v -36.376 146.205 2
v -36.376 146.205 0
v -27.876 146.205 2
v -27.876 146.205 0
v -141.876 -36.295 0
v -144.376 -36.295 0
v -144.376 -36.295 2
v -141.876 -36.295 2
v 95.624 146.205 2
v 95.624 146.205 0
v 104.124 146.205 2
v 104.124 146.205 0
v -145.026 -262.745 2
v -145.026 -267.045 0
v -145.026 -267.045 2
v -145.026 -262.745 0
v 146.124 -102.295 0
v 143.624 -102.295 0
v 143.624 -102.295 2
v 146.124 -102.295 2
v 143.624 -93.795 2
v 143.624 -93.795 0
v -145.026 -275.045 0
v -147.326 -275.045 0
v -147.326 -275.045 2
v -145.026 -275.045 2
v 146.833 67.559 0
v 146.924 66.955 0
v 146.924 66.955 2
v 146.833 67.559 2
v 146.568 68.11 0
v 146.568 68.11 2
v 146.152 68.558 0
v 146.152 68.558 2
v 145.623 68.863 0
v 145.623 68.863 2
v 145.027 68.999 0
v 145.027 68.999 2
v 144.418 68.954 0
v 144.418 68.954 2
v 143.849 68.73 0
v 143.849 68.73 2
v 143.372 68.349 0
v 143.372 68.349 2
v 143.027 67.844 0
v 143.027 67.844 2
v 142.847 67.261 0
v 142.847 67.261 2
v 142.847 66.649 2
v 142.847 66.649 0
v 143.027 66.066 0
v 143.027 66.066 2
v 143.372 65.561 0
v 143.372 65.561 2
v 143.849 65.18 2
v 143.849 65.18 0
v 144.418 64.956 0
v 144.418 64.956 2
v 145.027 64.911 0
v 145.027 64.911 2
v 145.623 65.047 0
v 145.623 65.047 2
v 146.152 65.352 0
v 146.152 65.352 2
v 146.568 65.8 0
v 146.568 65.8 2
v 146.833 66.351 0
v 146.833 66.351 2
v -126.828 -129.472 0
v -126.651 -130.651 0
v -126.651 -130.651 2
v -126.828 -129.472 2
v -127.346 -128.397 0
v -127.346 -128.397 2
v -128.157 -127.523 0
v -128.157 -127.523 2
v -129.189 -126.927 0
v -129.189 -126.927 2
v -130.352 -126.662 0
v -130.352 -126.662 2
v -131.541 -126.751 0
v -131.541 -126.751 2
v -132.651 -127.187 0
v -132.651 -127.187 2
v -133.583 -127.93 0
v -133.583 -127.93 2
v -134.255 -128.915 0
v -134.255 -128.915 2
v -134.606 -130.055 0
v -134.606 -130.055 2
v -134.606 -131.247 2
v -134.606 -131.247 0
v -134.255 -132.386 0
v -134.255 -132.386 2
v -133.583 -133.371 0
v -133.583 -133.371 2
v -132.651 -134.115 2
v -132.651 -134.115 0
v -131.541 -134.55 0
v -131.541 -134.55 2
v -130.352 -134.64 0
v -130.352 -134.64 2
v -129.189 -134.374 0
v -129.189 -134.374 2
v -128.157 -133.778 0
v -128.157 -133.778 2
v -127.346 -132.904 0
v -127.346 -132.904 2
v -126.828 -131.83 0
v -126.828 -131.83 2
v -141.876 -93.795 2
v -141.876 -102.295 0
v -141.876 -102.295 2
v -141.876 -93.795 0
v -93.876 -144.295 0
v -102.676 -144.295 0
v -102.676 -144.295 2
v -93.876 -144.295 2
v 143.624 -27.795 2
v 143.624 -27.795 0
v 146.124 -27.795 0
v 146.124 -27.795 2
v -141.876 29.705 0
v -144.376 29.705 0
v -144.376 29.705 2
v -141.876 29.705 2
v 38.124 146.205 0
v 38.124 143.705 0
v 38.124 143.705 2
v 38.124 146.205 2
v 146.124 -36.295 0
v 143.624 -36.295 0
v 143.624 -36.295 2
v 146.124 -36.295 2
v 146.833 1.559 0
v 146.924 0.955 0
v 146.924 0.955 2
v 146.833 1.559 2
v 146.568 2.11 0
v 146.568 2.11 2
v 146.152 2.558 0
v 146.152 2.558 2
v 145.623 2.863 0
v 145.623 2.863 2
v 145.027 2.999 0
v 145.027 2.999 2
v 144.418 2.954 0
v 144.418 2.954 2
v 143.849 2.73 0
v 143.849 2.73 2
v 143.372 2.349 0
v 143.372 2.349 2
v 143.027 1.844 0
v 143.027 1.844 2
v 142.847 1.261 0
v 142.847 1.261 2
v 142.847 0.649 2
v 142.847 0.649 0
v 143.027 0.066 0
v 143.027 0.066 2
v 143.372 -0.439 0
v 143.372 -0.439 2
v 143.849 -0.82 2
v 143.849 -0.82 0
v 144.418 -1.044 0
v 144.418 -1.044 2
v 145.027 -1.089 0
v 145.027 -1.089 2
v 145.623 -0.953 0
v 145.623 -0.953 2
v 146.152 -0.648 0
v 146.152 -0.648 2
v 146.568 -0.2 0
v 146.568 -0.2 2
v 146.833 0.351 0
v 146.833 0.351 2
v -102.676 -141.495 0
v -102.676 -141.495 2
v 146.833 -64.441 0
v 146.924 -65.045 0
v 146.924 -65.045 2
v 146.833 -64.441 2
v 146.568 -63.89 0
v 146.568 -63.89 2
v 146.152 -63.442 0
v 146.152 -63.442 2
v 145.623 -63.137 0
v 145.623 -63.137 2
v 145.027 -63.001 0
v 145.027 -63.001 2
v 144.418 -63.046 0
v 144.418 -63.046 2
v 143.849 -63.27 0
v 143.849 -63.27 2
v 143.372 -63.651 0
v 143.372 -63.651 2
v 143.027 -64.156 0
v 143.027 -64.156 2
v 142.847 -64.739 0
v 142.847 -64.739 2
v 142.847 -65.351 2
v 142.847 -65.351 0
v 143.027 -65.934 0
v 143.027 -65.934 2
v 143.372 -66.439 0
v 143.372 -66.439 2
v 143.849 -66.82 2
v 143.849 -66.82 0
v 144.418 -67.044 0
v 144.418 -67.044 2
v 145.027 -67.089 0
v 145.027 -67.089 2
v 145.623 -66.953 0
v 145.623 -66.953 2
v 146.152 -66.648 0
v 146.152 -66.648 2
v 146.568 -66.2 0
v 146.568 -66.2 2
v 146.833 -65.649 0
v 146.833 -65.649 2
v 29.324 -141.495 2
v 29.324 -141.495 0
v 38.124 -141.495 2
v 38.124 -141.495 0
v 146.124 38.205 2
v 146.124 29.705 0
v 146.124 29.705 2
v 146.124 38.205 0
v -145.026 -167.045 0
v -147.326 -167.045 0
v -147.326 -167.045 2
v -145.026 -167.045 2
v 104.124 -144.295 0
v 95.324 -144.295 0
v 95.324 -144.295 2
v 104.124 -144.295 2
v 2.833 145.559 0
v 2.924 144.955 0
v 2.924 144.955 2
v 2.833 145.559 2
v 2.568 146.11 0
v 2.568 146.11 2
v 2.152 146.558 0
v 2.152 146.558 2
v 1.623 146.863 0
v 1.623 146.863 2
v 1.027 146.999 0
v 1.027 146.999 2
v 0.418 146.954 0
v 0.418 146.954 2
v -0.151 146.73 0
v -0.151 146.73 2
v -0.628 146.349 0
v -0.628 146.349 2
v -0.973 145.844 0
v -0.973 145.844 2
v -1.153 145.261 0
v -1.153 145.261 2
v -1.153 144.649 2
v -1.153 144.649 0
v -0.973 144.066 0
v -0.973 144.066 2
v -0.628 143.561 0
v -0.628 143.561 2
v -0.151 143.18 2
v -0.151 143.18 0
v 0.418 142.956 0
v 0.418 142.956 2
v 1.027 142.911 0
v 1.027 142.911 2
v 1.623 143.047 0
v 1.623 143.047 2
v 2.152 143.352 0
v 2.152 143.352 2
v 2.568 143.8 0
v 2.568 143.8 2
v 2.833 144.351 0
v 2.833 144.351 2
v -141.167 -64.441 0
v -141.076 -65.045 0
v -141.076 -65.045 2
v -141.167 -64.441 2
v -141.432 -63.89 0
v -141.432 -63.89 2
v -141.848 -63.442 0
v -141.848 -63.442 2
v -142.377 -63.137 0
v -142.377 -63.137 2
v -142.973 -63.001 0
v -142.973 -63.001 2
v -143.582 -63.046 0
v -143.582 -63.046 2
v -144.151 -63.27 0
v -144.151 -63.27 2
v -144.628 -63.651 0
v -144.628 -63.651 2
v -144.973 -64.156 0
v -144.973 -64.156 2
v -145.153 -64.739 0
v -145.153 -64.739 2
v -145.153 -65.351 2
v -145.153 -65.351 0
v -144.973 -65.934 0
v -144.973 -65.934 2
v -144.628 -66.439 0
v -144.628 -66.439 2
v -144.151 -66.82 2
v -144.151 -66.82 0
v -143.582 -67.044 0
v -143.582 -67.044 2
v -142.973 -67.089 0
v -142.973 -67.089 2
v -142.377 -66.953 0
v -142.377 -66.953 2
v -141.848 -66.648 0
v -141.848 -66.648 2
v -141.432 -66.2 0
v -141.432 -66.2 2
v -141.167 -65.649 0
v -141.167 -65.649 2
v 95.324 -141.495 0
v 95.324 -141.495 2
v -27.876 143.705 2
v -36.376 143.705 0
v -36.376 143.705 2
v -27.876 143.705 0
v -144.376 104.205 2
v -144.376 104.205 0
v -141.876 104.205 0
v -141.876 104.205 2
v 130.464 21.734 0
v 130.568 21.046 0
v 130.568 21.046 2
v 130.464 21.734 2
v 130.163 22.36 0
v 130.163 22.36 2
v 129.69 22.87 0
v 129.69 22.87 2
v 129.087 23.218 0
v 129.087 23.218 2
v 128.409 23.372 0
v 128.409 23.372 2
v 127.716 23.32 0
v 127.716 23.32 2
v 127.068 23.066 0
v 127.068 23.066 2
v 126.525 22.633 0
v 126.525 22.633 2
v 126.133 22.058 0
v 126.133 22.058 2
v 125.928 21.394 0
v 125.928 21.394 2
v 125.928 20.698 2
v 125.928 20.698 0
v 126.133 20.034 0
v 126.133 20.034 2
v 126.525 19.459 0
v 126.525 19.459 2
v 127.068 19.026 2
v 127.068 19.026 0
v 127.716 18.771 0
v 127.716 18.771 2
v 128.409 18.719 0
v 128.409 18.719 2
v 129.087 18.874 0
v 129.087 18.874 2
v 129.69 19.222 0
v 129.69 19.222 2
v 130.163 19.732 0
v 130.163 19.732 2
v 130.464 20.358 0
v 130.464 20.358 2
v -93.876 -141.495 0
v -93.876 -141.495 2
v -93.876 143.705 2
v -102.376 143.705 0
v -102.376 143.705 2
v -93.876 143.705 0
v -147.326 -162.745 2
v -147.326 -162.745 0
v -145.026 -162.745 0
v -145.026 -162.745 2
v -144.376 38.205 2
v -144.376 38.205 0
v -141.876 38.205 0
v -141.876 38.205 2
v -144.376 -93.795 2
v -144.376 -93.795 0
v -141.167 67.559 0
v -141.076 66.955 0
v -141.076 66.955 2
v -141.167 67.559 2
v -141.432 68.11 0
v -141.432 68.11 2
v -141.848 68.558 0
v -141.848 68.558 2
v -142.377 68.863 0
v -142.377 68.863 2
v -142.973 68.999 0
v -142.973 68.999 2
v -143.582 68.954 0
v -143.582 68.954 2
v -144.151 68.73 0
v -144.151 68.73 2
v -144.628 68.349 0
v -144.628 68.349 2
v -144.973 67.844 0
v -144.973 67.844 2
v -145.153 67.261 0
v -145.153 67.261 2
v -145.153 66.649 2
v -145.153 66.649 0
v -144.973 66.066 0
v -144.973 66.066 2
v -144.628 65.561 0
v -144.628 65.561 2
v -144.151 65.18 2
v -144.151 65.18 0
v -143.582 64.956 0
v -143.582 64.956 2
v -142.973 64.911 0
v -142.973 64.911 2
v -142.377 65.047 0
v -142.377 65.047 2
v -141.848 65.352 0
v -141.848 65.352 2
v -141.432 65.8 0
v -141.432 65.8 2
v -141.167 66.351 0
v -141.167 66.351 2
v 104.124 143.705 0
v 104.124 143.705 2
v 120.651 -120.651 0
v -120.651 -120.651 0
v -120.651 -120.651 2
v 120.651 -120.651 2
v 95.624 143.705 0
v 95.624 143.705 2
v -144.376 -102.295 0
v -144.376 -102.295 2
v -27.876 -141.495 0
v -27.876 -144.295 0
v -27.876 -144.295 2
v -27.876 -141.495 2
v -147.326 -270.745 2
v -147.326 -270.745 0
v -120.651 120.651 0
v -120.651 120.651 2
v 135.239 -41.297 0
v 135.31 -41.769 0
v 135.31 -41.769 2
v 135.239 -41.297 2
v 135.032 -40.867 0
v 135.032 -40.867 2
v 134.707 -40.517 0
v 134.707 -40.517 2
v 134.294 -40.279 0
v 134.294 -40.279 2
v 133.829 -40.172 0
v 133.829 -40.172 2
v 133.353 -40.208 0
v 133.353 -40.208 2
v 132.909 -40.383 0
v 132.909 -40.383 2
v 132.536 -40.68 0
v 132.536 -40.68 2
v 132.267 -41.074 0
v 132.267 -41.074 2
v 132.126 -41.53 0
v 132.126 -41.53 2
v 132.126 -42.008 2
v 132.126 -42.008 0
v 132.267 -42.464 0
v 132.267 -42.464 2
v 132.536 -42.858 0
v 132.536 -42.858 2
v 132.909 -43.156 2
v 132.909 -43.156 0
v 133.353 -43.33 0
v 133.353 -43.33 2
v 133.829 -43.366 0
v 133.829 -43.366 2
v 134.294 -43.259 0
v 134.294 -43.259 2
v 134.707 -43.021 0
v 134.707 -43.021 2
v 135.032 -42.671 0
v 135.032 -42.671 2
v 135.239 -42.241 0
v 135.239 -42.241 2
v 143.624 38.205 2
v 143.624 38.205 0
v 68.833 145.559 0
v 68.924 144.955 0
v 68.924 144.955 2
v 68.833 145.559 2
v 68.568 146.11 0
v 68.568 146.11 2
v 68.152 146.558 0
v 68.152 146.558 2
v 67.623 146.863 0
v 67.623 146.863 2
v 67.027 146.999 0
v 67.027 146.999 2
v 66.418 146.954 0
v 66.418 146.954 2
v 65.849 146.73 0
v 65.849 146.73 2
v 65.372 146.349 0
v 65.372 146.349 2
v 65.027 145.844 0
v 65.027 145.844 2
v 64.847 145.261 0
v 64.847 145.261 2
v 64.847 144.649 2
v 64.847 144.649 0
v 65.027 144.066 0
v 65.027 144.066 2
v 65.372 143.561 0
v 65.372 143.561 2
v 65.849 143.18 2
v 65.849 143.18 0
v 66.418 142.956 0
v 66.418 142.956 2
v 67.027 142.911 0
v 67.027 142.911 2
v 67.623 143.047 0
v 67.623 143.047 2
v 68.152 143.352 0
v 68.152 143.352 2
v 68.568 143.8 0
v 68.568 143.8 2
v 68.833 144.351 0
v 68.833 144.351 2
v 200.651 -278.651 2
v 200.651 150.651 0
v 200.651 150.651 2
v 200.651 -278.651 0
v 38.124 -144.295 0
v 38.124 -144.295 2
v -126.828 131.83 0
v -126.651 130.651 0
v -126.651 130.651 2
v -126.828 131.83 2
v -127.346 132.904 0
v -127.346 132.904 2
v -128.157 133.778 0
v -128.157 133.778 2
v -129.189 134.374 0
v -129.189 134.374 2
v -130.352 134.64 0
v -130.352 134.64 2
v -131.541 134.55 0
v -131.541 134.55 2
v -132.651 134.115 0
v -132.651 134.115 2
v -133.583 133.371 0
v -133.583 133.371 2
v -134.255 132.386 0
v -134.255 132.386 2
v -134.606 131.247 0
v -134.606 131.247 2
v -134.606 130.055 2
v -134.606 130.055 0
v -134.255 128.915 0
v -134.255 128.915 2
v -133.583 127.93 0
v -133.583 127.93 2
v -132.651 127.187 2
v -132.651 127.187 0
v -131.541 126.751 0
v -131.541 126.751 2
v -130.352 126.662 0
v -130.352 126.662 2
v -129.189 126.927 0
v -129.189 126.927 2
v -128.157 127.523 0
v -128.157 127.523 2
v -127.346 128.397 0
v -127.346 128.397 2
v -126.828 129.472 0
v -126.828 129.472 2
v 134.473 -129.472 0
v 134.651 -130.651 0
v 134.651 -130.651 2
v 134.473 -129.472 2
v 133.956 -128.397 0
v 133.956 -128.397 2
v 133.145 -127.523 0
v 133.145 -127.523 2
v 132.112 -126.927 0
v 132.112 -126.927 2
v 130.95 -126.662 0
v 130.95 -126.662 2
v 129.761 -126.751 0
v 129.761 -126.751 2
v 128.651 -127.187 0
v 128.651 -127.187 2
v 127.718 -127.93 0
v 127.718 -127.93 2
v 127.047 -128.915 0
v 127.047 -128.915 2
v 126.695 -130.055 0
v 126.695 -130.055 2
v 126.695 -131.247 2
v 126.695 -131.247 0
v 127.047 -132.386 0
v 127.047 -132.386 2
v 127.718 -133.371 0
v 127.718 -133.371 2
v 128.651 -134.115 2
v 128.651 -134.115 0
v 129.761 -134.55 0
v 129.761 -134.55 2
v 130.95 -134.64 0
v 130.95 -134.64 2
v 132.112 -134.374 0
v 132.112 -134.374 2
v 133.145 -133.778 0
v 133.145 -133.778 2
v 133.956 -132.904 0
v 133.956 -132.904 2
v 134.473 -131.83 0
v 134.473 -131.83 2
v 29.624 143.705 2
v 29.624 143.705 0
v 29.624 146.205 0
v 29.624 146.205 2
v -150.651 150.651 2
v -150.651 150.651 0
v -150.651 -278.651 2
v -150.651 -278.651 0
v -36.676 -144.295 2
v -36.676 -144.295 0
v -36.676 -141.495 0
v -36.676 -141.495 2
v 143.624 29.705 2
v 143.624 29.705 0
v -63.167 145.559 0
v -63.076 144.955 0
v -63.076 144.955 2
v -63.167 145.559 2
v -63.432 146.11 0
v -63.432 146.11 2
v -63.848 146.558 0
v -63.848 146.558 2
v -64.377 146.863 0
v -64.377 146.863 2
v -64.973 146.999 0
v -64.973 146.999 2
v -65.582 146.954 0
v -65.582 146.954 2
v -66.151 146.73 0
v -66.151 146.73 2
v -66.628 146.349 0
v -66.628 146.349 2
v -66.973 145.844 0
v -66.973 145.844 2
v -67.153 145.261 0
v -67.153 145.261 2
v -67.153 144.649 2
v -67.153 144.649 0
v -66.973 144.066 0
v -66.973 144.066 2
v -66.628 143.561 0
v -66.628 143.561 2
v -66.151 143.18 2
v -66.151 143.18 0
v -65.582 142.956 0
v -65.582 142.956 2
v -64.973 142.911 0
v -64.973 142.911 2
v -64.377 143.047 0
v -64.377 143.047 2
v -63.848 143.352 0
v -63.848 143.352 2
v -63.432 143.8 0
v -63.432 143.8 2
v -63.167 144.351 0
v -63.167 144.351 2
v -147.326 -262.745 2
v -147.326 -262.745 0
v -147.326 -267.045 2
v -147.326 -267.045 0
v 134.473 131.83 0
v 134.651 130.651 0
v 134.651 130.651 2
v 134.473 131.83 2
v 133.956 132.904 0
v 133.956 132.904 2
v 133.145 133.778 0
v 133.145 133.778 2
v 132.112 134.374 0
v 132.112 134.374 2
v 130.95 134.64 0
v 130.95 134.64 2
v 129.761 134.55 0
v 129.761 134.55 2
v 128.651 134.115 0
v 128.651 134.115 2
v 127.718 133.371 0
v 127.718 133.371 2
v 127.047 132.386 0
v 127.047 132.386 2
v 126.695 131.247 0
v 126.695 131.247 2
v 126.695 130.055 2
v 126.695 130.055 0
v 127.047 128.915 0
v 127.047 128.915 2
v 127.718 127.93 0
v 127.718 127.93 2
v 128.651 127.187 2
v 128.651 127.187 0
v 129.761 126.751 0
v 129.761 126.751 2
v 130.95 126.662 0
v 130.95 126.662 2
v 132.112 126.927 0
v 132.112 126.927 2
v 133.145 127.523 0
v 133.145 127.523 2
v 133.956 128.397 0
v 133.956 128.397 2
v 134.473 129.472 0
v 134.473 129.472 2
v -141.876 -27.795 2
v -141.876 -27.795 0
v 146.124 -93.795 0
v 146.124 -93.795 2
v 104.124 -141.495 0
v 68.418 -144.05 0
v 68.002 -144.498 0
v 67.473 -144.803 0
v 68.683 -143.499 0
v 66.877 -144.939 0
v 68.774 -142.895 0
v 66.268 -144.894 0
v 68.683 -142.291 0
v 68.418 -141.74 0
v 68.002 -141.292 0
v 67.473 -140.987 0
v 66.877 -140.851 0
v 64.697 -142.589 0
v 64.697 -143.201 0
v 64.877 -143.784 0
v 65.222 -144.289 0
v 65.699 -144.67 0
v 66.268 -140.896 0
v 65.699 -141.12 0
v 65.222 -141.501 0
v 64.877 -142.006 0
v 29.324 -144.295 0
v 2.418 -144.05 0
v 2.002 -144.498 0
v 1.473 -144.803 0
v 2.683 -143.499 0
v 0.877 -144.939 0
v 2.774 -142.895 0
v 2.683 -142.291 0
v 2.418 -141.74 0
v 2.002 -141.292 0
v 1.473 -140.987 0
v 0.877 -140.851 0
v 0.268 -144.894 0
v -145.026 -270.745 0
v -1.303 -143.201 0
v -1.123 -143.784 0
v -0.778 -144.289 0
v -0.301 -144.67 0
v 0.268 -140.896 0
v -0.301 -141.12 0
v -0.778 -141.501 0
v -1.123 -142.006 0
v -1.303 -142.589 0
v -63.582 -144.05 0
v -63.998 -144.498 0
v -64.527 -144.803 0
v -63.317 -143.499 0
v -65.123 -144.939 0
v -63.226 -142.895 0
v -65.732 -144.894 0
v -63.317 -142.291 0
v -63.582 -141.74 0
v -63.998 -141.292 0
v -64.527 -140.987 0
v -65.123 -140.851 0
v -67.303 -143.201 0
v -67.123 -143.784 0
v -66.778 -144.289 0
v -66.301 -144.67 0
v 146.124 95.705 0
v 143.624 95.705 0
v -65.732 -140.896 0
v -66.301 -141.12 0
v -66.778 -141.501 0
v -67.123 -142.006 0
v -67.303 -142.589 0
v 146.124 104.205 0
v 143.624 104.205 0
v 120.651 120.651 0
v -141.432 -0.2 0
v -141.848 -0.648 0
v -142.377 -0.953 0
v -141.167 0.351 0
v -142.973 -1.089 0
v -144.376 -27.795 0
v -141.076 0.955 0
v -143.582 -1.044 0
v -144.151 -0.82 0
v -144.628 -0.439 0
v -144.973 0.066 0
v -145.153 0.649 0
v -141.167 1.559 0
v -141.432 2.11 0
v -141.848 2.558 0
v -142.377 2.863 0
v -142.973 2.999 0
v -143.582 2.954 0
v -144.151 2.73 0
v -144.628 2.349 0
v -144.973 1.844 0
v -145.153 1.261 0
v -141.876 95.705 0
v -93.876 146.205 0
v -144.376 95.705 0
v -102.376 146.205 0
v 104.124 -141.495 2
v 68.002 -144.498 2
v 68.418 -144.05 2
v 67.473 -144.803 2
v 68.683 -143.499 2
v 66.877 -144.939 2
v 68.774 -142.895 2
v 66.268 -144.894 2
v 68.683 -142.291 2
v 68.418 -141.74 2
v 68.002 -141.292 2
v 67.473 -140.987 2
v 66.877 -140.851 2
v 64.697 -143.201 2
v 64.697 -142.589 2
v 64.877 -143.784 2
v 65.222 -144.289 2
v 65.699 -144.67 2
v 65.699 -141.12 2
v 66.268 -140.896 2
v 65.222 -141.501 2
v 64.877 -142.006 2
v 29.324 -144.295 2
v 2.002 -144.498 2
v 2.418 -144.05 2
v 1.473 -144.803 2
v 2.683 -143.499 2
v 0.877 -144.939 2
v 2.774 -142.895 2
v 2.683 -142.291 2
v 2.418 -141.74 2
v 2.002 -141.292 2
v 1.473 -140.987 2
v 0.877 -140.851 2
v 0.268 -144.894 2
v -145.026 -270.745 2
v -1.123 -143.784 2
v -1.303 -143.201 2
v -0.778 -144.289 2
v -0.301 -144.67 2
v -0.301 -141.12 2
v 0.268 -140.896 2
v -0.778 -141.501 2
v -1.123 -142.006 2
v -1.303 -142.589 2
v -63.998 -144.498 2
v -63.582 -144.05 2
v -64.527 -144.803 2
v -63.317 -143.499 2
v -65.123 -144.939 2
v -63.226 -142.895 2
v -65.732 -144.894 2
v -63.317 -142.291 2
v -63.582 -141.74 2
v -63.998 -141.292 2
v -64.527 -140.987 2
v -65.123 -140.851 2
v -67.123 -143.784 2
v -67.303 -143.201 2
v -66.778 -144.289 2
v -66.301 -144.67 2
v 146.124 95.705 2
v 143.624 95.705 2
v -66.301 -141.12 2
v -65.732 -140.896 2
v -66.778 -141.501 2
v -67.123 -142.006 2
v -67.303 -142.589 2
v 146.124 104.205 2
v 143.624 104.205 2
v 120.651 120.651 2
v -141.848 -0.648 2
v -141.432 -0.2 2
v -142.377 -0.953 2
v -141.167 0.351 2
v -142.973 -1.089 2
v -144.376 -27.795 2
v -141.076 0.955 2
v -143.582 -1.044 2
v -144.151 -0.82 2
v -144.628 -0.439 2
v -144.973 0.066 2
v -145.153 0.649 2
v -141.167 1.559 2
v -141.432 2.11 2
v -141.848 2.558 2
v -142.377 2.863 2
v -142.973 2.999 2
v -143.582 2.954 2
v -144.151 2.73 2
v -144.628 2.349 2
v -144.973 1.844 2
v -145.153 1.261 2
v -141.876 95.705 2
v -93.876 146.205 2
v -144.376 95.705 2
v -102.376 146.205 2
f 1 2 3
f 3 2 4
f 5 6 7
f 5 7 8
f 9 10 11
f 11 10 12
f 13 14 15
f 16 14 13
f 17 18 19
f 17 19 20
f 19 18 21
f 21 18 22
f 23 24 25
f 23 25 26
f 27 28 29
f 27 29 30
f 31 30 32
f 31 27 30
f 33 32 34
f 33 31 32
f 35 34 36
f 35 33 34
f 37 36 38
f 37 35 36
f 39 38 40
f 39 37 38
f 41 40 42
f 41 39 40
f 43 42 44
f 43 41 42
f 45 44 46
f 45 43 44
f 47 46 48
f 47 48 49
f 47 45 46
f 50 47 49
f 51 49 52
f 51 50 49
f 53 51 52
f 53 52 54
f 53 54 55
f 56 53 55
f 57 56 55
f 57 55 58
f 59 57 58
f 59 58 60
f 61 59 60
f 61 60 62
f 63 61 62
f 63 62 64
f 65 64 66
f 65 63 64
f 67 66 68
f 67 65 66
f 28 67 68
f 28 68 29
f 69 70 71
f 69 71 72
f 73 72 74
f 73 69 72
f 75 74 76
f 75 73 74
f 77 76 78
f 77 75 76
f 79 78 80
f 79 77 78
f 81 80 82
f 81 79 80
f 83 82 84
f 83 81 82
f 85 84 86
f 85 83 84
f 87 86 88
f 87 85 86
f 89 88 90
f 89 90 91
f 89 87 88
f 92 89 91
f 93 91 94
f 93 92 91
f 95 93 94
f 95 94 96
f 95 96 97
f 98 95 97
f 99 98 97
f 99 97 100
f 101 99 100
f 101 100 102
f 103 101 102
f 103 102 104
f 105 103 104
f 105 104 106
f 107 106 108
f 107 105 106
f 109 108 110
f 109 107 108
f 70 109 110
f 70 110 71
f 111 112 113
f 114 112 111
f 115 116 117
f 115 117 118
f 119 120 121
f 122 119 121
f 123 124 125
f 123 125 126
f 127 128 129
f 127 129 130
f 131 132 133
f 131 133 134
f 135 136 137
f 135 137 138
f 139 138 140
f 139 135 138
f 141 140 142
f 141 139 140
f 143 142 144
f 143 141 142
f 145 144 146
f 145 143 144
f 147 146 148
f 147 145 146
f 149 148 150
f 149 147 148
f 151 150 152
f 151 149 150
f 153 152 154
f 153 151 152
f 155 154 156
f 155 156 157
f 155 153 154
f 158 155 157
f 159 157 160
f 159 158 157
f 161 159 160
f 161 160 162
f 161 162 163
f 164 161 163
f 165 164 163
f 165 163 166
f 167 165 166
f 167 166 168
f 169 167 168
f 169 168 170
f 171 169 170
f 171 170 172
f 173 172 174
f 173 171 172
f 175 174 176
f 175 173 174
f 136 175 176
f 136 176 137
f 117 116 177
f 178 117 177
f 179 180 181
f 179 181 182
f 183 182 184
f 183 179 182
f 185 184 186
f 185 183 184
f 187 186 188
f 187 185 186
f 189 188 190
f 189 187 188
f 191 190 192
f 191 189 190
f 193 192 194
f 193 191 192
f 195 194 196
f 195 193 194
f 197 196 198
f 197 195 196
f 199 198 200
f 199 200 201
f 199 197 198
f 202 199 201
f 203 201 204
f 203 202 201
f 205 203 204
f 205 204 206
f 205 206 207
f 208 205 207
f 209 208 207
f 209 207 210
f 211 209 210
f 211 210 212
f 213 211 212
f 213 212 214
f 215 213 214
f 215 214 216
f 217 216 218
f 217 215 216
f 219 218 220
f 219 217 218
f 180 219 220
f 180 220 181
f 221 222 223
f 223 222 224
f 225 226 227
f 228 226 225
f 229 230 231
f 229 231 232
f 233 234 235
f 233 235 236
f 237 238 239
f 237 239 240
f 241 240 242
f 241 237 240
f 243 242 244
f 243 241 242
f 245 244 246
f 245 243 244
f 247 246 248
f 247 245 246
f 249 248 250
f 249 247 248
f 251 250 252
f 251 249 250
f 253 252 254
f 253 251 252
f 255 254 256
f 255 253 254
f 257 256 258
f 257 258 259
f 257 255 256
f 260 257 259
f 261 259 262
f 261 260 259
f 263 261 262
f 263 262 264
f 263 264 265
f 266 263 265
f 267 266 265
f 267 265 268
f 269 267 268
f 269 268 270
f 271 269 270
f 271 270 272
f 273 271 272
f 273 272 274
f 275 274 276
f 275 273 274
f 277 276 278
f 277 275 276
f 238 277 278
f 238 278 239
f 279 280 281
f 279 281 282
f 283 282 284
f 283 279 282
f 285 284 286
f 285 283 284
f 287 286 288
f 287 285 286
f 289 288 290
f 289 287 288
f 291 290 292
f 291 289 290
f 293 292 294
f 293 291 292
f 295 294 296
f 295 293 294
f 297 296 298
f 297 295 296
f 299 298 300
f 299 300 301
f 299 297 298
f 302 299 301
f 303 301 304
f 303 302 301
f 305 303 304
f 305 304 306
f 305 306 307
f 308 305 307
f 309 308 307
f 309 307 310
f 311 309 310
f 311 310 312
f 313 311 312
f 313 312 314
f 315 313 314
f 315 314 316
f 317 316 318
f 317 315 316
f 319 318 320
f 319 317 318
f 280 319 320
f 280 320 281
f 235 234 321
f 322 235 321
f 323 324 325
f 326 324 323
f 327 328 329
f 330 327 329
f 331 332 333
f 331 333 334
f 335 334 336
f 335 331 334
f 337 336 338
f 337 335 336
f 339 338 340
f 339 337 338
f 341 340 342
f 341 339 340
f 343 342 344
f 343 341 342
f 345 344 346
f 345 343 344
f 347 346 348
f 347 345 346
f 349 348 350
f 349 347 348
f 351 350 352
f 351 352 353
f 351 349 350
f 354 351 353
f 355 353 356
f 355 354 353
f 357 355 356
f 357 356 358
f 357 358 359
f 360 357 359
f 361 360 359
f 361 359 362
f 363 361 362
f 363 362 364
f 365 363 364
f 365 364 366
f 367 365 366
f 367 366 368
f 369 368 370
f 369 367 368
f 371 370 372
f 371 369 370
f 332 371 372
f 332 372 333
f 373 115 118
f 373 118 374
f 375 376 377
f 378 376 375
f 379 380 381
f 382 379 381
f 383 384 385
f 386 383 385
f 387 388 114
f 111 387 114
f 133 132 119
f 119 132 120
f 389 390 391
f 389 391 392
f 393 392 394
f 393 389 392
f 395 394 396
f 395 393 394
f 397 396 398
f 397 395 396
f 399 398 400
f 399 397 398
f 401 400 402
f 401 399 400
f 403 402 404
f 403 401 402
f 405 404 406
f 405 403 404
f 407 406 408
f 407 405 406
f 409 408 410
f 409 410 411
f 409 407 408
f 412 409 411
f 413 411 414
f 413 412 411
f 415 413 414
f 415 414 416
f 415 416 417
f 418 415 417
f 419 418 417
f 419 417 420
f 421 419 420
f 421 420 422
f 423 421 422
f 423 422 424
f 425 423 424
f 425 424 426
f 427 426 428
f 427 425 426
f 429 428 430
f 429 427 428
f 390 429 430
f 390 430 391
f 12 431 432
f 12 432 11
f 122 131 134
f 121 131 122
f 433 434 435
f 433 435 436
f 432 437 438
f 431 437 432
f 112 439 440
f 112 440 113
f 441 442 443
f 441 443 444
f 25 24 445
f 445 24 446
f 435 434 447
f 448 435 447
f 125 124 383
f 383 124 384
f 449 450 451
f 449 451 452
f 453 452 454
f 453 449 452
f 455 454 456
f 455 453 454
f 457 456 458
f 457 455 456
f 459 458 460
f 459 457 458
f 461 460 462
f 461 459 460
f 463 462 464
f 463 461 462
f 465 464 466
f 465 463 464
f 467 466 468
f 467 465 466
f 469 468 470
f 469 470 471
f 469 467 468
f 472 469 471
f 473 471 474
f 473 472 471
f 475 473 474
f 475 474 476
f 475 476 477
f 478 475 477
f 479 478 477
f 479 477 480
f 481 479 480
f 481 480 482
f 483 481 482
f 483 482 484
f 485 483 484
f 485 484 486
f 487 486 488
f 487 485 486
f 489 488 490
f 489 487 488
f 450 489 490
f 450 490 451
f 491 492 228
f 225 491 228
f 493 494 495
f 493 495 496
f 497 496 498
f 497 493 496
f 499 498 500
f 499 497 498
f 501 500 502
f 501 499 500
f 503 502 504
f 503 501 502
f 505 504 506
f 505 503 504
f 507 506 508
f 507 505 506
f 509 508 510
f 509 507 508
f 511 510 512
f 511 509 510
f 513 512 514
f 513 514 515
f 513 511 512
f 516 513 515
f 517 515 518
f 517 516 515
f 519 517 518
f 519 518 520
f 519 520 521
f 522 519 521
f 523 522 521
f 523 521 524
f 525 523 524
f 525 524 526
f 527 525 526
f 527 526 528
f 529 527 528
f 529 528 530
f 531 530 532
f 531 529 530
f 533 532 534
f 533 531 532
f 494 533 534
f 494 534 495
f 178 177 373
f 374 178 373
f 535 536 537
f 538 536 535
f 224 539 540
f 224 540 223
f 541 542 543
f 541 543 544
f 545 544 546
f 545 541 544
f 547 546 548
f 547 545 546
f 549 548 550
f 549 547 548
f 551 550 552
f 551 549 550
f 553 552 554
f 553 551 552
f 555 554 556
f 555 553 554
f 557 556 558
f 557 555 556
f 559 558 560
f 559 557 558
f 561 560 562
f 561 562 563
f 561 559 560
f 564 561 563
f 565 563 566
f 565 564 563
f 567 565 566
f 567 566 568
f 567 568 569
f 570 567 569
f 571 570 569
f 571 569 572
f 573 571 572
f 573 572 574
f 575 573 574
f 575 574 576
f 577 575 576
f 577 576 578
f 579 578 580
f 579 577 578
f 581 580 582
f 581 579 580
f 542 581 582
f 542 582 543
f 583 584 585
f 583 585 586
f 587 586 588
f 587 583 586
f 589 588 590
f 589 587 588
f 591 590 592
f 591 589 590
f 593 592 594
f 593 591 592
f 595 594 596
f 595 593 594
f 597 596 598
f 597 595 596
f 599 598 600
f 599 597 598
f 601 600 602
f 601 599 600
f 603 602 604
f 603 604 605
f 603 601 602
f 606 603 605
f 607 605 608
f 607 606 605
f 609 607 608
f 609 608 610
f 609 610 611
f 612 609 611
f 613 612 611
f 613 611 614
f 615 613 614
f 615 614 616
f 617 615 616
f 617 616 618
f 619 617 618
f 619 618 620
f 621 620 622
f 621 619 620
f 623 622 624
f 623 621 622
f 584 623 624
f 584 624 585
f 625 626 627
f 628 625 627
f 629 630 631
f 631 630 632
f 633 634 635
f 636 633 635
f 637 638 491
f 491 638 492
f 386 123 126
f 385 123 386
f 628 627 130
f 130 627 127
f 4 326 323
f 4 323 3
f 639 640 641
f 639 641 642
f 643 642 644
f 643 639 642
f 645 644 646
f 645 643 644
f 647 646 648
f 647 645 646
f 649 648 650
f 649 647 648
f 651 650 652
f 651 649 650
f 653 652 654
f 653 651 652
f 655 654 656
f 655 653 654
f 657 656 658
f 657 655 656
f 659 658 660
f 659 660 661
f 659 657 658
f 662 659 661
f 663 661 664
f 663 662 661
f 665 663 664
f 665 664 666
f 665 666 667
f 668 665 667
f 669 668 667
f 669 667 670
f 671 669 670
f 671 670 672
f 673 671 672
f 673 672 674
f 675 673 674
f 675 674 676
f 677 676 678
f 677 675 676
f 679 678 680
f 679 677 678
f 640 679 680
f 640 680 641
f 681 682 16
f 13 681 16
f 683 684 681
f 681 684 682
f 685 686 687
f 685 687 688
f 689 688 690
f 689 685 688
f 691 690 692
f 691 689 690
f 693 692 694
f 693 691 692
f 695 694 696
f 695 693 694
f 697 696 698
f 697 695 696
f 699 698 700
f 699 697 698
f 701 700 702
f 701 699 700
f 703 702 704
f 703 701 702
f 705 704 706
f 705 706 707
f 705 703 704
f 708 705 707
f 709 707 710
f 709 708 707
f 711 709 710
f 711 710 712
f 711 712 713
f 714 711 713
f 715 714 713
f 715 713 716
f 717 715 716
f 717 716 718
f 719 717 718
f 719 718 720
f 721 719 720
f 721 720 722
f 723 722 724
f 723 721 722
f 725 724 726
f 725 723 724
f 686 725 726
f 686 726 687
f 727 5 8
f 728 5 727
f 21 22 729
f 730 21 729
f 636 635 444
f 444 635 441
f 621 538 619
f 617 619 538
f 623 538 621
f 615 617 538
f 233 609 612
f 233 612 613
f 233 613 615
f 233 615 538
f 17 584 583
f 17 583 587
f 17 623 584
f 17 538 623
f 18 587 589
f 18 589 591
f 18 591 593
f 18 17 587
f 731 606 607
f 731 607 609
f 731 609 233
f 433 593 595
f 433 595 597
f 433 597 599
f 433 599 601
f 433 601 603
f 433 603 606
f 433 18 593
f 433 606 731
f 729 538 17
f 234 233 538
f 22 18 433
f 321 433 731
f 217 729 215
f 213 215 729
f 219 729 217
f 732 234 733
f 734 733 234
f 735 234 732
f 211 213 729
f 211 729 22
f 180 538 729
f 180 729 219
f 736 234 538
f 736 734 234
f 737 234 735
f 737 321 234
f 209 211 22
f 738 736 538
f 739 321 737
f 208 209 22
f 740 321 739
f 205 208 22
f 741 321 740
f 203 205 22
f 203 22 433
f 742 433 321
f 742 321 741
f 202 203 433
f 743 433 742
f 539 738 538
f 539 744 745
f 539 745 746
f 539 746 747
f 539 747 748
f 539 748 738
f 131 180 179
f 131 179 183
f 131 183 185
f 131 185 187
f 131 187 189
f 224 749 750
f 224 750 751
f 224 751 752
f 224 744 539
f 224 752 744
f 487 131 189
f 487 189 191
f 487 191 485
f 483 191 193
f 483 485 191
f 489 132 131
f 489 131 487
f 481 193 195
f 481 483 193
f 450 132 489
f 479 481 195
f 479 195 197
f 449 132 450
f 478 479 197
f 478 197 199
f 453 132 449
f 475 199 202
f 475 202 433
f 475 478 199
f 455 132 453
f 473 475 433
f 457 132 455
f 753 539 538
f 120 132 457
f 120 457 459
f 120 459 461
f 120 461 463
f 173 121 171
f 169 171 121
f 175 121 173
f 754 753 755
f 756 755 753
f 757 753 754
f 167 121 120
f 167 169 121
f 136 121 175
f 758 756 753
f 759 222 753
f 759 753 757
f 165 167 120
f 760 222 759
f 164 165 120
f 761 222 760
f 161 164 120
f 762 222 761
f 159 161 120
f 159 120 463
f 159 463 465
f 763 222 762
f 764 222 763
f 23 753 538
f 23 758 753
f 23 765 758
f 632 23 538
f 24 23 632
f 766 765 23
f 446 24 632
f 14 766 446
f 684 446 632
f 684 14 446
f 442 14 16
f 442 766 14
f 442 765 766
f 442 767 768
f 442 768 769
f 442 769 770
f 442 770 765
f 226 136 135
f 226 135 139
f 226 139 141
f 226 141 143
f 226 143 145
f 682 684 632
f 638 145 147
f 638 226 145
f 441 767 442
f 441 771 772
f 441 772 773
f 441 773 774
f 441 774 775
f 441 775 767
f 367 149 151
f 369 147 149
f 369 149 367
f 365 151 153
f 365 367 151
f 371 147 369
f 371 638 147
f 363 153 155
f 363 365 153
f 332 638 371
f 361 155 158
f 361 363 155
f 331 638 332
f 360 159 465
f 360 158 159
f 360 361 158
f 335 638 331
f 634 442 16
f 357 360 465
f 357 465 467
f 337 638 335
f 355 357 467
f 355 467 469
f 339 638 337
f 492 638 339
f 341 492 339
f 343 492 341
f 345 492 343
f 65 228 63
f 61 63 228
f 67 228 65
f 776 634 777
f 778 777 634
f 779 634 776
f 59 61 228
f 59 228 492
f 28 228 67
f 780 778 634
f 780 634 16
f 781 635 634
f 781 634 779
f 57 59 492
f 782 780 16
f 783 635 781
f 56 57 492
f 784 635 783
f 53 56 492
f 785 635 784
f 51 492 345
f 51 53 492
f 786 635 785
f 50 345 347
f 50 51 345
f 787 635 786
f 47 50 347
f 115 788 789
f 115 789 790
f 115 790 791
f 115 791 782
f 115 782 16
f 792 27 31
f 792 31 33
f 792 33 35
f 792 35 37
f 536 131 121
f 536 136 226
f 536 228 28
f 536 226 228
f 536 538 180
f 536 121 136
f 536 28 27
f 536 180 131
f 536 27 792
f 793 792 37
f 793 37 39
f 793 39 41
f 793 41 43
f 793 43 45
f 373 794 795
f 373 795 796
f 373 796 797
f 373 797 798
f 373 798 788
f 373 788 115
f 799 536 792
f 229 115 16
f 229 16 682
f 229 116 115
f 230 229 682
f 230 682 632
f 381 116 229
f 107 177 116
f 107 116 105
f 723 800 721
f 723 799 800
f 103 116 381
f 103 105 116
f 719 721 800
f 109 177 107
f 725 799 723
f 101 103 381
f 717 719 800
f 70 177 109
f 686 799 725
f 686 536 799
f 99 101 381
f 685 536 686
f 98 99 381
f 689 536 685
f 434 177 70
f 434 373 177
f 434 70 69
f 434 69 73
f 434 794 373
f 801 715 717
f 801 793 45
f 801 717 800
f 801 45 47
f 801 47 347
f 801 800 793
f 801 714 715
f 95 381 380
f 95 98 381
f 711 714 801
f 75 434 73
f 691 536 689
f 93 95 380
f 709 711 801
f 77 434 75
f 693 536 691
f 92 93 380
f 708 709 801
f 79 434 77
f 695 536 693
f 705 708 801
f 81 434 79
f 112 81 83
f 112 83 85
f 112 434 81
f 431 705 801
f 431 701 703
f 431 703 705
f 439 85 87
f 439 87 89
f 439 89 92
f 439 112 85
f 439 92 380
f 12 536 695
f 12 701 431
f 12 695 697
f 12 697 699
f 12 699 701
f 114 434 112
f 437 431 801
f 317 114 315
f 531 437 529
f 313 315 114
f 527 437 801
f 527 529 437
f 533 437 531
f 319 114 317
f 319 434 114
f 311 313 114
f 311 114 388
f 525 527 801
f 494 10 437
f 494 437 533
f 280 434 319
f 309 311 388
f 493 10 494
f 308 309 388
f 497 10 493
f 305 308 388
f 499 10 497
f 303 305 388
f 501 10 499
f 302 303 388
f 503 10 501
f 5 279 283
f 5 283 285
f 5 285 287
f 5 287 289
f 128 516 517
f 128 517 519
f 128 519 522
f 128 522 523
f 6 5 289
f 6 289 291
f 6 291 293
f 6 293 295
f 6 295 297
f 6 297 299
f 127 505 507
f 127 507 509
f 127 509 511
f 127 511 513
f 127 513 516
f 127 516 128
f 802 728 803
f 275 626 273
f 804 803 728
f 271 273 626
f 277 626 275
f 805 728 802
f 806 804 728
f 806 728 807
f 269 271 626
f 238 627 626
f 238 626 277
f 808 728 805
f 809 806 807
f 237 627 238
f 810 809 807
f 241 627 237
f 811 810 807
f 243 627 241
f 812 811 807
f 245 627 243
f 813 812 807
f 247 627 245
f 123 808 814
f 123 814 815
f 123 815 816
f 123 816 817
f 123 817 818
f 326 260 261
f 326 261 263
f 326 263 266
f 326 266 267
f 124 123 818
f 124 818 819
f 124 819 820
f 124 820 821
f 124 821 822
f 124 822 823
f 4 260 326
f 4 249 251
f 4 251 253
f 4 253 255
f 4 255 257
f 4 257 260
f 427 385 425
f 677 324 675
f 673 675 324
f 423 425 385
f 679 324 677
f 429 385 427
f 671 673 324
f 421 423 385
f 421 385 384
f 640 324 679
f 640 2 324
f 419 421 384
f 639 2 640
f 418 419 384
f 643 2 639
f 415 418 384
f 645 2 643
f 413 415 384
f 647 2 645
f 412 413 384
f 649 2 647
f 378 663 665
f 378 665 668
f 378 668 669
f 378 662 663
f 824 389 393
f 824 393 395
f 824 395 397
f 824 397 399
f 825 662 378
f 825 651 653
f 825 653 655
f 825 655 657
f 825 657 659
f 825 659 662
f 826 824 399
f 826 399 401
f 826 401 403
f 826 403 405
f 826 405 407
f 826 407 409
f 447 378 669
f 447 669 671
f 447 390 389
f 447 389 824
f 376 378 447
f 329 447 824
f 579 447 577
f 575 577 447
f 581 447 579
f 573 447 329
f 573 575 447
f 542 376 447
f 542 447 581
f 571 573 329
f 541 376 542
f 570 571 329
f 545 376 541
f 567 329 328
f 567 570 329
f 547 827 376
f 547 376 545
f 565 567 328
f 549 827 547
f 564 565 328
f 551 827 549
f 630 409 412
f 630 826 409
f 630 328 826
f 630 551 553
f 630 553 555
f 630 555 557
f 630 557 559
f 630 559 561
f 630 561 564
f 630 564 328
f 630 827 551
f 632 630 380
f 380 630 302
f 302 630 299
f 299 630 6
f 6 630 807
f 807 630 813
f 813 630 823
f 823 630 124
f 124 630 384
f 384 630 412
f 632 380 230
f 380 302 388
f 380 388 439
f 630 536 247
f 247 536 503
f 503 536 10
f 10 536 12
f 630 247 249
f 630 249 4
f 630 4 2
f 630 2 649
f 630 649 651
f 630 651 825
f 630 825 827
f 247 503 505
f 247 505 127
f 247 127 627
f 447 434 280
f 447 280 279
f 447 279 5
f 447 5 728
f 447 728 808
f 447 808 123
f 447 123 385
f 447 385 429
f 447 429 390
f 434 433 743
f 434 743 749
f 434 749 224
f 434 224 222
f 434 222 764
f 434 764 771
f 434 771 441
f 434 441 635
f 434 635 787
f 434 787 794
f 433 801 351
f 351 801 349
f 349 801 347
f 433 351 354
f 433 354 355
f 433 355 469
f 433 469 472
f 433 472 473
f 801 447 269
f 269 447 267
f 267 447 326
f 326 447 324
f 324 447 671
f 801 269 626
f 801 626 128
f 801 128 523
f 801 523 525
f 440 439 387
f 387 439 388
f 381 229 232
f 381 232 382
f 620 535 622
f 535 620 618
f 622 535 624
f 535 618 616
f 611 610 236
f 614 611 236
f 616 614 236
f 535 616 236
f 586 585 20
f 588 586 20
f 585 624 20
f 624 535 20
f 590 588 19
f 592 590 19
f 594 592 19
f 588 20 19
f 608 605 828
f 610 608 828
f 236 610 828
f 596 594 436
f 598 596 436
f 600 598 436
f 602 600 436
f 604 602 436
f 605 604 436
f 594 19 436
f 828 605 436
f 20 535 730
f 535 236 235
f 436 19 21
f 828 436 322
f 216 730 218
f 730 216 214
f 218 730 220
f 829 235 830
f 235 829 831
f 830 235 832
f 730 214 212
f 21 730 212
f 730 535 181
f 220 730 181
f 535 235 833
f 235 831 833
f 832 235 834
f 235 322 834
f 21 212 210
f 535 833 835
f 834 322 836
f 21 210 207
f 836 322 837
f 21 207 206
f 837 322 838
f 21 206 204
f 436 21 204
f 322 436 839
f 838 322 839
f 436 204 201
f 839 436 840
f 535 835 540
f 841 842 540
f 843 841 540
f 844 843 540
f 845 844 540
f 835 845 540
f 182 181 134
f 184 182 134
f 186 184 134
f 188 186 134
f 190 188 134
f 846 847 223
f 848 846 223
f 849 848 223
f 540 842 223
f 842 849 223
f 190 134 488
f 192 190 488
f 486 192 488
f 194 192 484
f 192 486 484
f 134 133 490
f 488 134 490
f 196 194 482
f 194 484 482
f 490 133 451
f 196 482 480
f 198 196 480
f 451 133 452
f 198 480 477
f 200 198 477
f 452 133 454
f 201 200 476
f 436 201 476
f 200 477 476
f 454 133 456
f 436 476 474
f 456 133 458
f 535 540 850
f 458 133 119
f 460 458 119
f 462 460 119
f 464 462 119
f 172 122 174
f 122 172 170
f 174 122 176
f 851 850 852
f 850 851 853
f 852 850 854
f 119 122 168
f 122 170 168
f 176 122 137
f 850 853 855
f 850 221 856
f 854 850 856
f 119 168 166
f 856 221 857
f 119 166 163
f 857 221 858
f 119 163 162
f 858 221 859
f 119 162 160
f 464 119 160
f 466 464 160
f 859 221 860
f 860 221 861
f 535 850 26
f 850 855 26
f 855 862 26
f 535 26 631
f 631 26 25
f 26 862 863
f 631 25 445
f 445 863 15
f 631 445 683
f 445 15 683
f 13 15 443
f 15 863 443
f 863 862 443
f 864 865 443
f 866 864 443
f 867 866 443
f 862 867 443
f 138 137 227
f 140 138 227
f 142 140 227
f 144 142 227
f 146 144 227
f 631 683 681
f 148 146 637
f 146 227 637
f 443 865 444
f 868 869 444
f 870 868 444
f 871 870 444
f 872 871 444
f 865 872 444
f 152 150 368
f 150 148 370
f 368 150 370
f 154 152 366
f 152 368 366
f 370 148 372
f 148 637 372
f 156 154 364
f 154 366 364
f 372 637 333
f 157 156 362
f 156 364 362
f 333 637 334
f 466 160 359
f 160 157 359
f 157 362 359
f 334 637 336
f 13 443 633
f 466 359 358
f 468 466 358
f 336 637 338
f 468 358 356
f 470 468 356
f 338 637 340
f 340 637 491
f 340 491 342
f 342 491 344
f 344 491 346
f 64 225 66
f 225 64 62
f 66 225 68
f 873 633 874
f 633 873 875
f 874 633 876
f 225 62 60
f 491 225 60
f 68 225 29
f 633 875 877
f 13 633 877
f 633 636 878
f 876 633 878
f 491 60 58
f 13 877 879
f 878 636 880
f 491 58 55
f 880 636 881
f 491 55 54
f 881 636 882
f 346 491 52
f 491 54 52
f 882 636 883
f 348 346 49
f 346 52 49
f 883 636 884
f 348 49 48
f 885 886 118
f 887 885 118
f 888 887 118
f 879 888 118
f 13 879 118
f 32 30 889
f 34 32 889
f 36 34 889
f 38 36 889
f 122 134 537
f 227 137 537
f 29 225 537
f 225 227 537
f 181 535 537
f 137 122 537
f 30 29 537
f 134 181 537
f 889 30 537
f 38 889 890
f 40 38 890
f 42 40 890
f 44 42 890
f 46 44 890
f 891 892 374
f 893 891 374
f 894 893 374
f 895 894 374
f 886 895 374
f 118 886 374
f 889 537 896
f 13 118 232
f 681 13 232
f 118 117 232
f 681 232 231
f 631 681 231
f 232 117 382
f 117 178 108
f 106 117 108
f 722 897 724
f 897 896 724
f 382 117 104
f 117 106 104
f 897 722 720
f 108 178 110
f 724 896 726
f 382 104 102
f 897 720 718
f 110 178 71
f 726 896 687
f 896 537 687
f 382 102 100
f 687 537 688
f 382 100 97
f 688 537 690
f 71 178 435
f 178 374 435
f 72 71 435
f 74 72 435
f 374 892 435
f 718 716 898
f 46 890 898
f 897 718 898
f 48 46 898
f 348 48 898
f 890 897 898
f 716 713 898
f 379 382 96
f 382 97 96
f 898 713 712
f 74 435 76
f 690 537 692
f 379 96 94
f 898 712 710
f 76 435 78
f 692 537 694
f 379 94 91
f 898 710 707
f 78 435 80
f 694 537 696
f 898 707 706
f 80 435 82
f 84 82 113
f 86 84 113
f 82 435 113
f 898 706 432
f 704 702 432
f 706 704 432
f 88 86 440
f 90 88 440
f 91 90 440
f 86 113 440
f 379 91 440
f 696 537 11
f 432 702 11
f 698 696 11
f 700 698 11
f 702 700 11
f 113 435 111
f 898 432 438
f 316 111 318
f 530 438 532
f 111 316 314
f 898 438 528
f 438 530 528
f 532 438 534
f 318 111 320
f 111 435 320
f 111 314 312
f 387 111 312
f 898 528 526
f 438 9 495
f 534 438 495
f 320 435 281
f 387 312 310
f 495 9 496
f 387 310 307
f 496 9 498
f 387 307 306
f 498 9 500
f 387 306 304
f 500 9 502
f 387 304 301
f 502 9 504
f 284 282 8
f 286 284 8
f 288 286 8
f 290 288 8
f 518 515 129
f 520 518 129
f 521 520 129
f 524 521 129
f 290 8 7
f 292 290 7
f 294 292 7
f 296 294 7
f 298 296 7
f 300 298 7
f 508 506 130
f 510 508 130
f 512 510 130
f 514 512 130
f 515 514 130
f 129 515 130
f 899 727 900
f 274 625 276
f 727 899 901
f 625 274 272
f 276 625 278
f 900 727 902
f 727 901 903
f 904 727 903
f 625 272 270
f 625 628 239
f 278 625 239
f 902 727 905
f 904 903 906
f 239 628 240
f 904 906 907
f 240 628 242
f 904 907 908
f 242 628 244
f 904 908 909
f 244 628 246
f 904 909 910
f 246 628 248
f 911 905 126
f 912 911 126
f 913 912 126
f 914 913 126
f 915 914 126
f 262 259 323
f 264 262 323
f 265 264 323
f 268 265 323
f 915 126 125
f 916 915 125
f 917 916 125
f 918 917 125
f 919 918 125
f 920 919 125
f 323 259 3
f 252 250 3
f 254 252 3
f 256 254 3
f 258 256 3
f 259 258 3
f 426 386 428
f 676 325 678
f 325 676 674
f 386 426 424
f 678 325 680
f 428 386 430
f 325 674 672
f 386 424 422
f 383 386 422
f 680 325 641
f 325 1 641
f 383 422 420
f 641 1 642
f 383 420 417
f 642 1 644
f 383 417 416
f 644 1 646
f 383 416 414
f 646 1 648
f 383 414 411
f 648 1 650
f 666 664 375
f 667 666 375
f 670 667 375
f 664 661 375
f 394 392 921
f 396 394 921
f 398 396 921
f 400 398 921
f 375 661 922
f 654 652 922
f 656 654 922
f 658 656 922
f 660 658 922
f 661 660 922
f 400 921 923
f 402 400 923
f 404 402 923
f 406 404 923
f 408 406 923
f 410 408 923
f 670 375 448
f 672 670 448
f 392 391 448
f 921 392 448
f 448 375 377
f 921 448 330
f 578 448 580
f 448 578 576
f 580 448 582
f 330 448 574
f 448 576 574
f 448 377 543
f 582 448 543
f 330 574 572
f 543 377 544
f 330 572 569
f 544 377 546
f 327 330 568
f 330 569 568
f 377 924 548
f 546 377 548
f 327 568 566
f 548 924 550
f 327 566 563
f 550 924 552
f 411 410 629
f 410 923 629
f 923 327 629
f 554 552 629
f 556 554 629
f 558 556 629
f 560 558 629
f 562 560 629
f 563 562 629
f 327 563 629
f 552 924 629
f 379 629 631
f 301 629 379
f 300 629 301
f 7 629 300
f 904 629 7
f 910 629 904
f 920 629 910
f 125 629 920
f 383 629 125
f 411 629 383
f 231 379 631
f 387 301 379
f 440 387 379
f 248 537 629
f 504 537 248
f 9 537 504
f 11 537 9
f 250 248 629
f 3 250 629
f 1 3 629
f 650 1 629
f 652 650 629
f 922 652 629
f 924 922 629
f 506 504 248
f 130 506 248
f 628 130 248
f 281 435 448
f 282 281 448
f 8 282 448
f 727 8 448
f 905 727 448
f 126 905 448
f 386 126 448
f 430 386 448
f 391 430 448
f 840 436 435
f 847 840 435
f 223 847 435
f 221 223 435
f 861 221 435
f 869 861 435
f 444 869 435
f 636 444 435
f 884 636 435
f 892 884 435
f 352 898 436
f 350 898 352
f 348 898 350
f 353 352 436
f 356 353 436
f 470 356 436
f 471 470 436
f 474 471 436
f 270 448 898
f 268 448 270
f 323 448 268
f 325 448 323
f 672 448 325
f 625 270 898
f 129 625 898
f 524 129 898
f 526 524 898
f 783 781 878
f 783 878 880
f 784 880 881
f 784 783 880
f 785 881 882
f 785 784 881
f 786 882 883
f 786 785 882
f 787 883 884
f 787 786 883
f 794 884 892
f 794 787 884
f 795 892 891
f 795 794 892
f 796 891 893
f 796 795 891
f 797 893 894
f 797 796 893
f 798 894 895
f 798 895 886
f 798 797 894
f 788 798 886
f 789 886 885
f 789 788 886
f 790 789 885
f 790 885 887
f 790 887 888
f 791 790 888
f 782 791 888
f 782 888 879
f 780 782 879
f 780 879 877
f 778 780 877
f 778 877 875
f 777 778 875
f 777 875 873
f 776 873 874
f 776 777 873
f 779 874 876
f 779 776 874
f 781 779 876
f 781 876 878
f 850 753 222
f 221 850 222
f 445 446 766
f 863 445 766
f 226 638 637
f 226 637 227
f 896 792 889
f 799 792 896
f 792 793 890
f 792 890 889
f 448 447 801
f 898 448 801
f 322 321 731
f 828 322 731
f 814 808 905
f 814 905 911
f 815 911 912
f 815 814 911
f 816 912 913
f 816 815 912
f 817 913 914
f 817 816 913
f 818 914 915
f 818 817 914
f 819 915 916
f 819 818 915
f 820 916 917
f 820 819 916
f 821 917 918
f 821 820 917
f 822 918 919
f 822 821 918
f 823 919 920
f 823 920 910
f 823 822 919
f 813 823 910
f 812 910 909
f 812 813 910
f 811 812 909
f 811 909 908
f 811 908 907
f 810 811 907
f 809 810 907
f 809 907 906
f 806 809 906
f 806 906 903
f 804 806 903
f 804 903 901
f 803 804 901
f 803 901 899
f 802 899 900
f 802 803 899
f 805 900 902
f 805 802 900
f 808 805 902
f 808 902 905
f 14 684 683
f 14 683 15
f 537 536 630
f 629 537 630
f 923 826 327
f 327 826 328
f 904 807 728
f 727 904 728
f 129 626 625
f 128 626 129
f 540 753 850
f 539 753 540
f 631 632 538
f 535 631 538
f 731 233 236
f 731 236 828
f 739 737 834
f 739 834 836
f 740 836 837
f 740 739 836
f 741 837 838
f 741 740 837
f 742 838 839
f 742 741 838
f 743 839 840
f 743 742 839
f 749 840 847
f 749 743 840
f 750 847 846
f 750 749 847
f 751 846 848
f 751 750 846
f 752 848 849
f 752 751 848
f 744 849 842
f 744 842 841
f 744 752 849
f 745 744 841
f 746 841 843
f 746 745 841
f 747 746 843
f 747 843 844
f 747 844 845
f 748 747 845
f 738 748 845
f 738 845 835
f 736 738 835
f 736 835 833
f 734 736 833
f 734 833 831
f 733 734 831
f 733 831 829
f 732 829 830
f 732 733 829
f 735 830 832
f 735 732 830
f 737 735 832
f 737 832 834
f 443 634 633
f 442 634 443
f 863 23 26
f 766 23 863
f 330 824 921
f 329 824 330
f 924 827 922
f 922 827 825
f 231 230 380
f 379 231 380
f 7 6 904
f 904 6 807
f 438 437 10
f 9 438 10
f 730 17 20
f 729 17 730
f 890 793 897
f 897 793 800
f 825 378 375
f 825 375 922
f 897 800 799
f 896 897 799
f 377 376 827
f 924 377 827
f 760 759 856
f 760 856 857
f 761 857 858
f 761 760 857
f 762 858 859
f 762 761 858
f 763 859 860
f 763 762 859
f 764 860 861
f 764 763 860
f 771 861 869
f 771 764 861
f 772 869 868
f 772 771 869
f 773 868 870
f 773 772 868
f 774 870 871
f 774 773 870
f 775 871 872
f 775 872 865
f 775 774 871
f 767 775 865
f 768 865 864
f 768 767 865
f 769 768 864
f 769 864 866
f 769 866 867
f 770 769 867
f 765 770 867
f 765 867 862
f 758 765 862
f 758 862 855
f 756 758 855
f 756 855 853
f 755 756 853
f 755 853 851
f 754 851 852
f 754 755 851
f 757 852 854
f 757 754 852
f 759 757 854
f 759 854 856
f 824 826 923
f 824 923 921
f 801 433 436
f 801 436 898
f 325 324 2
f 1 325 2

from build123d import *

# Parameters (mm, degrees)
SKETCH_1_R      = 2.05
SKETCH_1_R_2    = 4
SKETCH_1_R_3    = 2.332988974
SKETCH_1_R_4    = 1.601067765
SKETCH_1_W      = 8.8
SKETCH_1_H      = 2.8
SKETCH_1_W_2    = 2.5
SKETCH_1_H_2    = 8.5
SKETCH_1_W_3    = 8.5
SKETCH_1_H_3    = 2.5
SKETCH_1_W_4    = 241.301375666
SKETCH_1_H_4    = 241.301375666
SKETCH_1_W_5    = 2.3
SKETCH_1_H_5    = 4.3
EXTRUDE_1_DEPTH = 2


with BuildPart() as part:
    # 草图1 → 凸台-拉伸1 (new body)
    with BuildSketch(Plane.XY):
        Polygon((-150.650687833, -150.650687833), (-150.650687833, 150.650687833), (150.650687833, 150.650687833), (200.650687833, 150.650687833), (200.650687833, -278.650687833), (150.650687833, -278.650687833), (-150.650687833, -278.650687833), align=None)
        with Locations((0.724285714, -142.895)):
            Circle(SKETCH_1_R, mode=Mode.SUBTRACT)
        with Locations((66.724285714, -142.895)):
            Circle(SKETCH_1_R, mode=Mode.SUBTRACT)
        with Locations((-65.275714286, -142.895)):
            Circle(SKETCH_1_R, mode=Mode.SUBTRACT)
        with Locations((-143.125714286, 66.955)):
            Circle(SKETCH_1_R, mode=Mode.SUBTRACT)
        with Locations((-143.125714286, 0.955)):
            Circle(SKETCH_1_R, mode=Mode.SUBTRACT)
        with Locations((-143.125714286, -65.045)):
            Circle(SKETCH_1_R, mode=Mode.SUBTRACT)
        with Locations((66.874285714, 144.955)):
            Circle(SKETCH_1_R, mode=Mode.SUBTRACT)
        with Locations((0.874285714, 144.955)):
            Circle(SKETCH_1_R, mode=Mode.SUBTRACT)
        with Locations((-65.125714286, 144.955)):
            Circle(SKETCH_1_R, mode=Mode.SUBTRACT)
        with Locations((144.874285714, -65.045)):
            Circle(SKETCH_1_R, mode=Mode.SUBTRACT)
        with Locations((144.874285714, 0.955)):
            Circle(SKETCH_1_R, mode=Mode.SUBTRACT)
        with Locations((144.874285714, 66.955)):
            Circle(SKETCH_1_R, mode=Mode.SUBTRACT)
        with Locations((-130.650687833, -130.650687833)):
            Circle(SKETCH_1_R_2, mode=Mode.SUBTRACT)
        with Locations((-130.650687833, 130.650687833)):
            Circle(SKETCH_1_R_2, mode=Mode.SUBTRACT)
        with Locations((130.650687833, 130.650687833)):
            Circle(SKETCH_1_R_2, mode=Mode.SUBTRACT)
        with Locations((130.650687833, -130.650687833)):
            Circle(SKETCH_1_R_2, mode=Mode.SUBTRACT)
        with Locations((128.234921063, 21.045946403)):
            Circle(SKETCH_1_R_3, mode=Mode.SUBTRACT)
        with Locations((133.709191973, -41.76906745)):
            Circle(SKETCH_1_R_4, mode=Mode.SUBTRACT)
        with Locations((99.724285714, -142.895)):
            Rectangle(SKETCH_1_W, SKETCH_1_H, mode=Mode.SUBTRACT)
        with Locations((33.724285714, -142.895)):
            Rectangle(SKETCH_1_W, SKETCH_1_H, mode=Mode.SUBTRACT)
        with Locations((-32.275714286, -142.895)):
            Rectangle(SKETCH_1_W, SKETCH_1_H, mode=Mode.SUBTRACT)
        with Locations((-98.275714286, -142.895)):
            Rectangle(SKETCH_1_W, SKETCH_1_H, mode=Mode.SUBTRACT)
        with Locations((-143.125714286, 99.955)):
            Rectangle(SKETCH_1_W_2, SKETCH_1_H_2, mode=Mode.SUBTRACT)
        with Locations((-143.125714286, 33.955)):
            Rectangle(SKETCH_1_W_2, SKETCH_1_H_2, mode=Mode.SUBTRACT)
        with Locations((-143.125714286, -32.045)):
            Rectangle(SKETCH_1_W_2, SKETCH_1_H_2, mode=Mode.SUBTRACT)
        with Locations((-143.125714286, -98.045)):
            Rectangle(SKETCH_1_W_2, SKETCH_1_H_2, mode=Mode.SUBTRACT)
        with Locations((99.874285714, 144.955)):
            Rectangle(SKETCH_1_W_3, SKETCH_1_H_3, mode=Mode.SUBTRACT)
        with Locations((33.874285714, 144.955)):
            Rectangle(SKETCH_1_W_3, SKETCH_1_H_3, mode=Mode.SUBTRACT)
        with Locations((-32.125714286, 144.955)):
            Rectangle(SKETCH_1_W_3, SKETCH_1_H_3, mode=Mode.SUBTRACT)
        with Locations((-98.125714286, 144.955)):
            Rectangle(SKETCH_1_W_3, SKETCH_1_H_3, mode=Mode.SUBTRACT)
        with Locations((144.874285714, -98.045)):
            Rectangle(SKETCH_1_W_2, SKETCH_1_H_2, mode=Mode.SUBTRACT)
        with Locations((144.874285714, -32.045)):
            Rectangle(SKETCH_1_W_2, SKETCH_1_H_2, mode=Mode.SUBTRACT)
        with Locations((144.874285714, 33.955)):
            Rectangle(SKETCH_1_W_2, SKETCH_1_H_2, mode=Mode.SUBTRACT)
        with Locations((144.874285714, 99.955)):
            Rectangle(SKETCH_1_W_2, SKETCH_1_H_2, mode=Mode.SUBTRACT)
        Rectangle(SKETCH_1_W_4, SKETCH_1_H_4, mode=Mode.SUBTRACT)
        with Locations((-146.175714286, -272.895)):
            Rectangle(SKETCH_1_W_5, SKETCH_1_H_5, mode=Mode.SUBTRACT)
        with Locations((-146.175714286, -264.895)):
            Rectangle(SKETCH_1_W_5, SKETCH_1_H_5, mode=Mode.SUBTRACT)
        with Locations((-146.175714286, -164.895)):
            Rectangle(SKETCH_1_W_5, SKETCH_1_H_5, mode=Mode.SUBTRACT)
    extrude(amount=EXTRUDE_1_DEPTH)


solid = part.part
